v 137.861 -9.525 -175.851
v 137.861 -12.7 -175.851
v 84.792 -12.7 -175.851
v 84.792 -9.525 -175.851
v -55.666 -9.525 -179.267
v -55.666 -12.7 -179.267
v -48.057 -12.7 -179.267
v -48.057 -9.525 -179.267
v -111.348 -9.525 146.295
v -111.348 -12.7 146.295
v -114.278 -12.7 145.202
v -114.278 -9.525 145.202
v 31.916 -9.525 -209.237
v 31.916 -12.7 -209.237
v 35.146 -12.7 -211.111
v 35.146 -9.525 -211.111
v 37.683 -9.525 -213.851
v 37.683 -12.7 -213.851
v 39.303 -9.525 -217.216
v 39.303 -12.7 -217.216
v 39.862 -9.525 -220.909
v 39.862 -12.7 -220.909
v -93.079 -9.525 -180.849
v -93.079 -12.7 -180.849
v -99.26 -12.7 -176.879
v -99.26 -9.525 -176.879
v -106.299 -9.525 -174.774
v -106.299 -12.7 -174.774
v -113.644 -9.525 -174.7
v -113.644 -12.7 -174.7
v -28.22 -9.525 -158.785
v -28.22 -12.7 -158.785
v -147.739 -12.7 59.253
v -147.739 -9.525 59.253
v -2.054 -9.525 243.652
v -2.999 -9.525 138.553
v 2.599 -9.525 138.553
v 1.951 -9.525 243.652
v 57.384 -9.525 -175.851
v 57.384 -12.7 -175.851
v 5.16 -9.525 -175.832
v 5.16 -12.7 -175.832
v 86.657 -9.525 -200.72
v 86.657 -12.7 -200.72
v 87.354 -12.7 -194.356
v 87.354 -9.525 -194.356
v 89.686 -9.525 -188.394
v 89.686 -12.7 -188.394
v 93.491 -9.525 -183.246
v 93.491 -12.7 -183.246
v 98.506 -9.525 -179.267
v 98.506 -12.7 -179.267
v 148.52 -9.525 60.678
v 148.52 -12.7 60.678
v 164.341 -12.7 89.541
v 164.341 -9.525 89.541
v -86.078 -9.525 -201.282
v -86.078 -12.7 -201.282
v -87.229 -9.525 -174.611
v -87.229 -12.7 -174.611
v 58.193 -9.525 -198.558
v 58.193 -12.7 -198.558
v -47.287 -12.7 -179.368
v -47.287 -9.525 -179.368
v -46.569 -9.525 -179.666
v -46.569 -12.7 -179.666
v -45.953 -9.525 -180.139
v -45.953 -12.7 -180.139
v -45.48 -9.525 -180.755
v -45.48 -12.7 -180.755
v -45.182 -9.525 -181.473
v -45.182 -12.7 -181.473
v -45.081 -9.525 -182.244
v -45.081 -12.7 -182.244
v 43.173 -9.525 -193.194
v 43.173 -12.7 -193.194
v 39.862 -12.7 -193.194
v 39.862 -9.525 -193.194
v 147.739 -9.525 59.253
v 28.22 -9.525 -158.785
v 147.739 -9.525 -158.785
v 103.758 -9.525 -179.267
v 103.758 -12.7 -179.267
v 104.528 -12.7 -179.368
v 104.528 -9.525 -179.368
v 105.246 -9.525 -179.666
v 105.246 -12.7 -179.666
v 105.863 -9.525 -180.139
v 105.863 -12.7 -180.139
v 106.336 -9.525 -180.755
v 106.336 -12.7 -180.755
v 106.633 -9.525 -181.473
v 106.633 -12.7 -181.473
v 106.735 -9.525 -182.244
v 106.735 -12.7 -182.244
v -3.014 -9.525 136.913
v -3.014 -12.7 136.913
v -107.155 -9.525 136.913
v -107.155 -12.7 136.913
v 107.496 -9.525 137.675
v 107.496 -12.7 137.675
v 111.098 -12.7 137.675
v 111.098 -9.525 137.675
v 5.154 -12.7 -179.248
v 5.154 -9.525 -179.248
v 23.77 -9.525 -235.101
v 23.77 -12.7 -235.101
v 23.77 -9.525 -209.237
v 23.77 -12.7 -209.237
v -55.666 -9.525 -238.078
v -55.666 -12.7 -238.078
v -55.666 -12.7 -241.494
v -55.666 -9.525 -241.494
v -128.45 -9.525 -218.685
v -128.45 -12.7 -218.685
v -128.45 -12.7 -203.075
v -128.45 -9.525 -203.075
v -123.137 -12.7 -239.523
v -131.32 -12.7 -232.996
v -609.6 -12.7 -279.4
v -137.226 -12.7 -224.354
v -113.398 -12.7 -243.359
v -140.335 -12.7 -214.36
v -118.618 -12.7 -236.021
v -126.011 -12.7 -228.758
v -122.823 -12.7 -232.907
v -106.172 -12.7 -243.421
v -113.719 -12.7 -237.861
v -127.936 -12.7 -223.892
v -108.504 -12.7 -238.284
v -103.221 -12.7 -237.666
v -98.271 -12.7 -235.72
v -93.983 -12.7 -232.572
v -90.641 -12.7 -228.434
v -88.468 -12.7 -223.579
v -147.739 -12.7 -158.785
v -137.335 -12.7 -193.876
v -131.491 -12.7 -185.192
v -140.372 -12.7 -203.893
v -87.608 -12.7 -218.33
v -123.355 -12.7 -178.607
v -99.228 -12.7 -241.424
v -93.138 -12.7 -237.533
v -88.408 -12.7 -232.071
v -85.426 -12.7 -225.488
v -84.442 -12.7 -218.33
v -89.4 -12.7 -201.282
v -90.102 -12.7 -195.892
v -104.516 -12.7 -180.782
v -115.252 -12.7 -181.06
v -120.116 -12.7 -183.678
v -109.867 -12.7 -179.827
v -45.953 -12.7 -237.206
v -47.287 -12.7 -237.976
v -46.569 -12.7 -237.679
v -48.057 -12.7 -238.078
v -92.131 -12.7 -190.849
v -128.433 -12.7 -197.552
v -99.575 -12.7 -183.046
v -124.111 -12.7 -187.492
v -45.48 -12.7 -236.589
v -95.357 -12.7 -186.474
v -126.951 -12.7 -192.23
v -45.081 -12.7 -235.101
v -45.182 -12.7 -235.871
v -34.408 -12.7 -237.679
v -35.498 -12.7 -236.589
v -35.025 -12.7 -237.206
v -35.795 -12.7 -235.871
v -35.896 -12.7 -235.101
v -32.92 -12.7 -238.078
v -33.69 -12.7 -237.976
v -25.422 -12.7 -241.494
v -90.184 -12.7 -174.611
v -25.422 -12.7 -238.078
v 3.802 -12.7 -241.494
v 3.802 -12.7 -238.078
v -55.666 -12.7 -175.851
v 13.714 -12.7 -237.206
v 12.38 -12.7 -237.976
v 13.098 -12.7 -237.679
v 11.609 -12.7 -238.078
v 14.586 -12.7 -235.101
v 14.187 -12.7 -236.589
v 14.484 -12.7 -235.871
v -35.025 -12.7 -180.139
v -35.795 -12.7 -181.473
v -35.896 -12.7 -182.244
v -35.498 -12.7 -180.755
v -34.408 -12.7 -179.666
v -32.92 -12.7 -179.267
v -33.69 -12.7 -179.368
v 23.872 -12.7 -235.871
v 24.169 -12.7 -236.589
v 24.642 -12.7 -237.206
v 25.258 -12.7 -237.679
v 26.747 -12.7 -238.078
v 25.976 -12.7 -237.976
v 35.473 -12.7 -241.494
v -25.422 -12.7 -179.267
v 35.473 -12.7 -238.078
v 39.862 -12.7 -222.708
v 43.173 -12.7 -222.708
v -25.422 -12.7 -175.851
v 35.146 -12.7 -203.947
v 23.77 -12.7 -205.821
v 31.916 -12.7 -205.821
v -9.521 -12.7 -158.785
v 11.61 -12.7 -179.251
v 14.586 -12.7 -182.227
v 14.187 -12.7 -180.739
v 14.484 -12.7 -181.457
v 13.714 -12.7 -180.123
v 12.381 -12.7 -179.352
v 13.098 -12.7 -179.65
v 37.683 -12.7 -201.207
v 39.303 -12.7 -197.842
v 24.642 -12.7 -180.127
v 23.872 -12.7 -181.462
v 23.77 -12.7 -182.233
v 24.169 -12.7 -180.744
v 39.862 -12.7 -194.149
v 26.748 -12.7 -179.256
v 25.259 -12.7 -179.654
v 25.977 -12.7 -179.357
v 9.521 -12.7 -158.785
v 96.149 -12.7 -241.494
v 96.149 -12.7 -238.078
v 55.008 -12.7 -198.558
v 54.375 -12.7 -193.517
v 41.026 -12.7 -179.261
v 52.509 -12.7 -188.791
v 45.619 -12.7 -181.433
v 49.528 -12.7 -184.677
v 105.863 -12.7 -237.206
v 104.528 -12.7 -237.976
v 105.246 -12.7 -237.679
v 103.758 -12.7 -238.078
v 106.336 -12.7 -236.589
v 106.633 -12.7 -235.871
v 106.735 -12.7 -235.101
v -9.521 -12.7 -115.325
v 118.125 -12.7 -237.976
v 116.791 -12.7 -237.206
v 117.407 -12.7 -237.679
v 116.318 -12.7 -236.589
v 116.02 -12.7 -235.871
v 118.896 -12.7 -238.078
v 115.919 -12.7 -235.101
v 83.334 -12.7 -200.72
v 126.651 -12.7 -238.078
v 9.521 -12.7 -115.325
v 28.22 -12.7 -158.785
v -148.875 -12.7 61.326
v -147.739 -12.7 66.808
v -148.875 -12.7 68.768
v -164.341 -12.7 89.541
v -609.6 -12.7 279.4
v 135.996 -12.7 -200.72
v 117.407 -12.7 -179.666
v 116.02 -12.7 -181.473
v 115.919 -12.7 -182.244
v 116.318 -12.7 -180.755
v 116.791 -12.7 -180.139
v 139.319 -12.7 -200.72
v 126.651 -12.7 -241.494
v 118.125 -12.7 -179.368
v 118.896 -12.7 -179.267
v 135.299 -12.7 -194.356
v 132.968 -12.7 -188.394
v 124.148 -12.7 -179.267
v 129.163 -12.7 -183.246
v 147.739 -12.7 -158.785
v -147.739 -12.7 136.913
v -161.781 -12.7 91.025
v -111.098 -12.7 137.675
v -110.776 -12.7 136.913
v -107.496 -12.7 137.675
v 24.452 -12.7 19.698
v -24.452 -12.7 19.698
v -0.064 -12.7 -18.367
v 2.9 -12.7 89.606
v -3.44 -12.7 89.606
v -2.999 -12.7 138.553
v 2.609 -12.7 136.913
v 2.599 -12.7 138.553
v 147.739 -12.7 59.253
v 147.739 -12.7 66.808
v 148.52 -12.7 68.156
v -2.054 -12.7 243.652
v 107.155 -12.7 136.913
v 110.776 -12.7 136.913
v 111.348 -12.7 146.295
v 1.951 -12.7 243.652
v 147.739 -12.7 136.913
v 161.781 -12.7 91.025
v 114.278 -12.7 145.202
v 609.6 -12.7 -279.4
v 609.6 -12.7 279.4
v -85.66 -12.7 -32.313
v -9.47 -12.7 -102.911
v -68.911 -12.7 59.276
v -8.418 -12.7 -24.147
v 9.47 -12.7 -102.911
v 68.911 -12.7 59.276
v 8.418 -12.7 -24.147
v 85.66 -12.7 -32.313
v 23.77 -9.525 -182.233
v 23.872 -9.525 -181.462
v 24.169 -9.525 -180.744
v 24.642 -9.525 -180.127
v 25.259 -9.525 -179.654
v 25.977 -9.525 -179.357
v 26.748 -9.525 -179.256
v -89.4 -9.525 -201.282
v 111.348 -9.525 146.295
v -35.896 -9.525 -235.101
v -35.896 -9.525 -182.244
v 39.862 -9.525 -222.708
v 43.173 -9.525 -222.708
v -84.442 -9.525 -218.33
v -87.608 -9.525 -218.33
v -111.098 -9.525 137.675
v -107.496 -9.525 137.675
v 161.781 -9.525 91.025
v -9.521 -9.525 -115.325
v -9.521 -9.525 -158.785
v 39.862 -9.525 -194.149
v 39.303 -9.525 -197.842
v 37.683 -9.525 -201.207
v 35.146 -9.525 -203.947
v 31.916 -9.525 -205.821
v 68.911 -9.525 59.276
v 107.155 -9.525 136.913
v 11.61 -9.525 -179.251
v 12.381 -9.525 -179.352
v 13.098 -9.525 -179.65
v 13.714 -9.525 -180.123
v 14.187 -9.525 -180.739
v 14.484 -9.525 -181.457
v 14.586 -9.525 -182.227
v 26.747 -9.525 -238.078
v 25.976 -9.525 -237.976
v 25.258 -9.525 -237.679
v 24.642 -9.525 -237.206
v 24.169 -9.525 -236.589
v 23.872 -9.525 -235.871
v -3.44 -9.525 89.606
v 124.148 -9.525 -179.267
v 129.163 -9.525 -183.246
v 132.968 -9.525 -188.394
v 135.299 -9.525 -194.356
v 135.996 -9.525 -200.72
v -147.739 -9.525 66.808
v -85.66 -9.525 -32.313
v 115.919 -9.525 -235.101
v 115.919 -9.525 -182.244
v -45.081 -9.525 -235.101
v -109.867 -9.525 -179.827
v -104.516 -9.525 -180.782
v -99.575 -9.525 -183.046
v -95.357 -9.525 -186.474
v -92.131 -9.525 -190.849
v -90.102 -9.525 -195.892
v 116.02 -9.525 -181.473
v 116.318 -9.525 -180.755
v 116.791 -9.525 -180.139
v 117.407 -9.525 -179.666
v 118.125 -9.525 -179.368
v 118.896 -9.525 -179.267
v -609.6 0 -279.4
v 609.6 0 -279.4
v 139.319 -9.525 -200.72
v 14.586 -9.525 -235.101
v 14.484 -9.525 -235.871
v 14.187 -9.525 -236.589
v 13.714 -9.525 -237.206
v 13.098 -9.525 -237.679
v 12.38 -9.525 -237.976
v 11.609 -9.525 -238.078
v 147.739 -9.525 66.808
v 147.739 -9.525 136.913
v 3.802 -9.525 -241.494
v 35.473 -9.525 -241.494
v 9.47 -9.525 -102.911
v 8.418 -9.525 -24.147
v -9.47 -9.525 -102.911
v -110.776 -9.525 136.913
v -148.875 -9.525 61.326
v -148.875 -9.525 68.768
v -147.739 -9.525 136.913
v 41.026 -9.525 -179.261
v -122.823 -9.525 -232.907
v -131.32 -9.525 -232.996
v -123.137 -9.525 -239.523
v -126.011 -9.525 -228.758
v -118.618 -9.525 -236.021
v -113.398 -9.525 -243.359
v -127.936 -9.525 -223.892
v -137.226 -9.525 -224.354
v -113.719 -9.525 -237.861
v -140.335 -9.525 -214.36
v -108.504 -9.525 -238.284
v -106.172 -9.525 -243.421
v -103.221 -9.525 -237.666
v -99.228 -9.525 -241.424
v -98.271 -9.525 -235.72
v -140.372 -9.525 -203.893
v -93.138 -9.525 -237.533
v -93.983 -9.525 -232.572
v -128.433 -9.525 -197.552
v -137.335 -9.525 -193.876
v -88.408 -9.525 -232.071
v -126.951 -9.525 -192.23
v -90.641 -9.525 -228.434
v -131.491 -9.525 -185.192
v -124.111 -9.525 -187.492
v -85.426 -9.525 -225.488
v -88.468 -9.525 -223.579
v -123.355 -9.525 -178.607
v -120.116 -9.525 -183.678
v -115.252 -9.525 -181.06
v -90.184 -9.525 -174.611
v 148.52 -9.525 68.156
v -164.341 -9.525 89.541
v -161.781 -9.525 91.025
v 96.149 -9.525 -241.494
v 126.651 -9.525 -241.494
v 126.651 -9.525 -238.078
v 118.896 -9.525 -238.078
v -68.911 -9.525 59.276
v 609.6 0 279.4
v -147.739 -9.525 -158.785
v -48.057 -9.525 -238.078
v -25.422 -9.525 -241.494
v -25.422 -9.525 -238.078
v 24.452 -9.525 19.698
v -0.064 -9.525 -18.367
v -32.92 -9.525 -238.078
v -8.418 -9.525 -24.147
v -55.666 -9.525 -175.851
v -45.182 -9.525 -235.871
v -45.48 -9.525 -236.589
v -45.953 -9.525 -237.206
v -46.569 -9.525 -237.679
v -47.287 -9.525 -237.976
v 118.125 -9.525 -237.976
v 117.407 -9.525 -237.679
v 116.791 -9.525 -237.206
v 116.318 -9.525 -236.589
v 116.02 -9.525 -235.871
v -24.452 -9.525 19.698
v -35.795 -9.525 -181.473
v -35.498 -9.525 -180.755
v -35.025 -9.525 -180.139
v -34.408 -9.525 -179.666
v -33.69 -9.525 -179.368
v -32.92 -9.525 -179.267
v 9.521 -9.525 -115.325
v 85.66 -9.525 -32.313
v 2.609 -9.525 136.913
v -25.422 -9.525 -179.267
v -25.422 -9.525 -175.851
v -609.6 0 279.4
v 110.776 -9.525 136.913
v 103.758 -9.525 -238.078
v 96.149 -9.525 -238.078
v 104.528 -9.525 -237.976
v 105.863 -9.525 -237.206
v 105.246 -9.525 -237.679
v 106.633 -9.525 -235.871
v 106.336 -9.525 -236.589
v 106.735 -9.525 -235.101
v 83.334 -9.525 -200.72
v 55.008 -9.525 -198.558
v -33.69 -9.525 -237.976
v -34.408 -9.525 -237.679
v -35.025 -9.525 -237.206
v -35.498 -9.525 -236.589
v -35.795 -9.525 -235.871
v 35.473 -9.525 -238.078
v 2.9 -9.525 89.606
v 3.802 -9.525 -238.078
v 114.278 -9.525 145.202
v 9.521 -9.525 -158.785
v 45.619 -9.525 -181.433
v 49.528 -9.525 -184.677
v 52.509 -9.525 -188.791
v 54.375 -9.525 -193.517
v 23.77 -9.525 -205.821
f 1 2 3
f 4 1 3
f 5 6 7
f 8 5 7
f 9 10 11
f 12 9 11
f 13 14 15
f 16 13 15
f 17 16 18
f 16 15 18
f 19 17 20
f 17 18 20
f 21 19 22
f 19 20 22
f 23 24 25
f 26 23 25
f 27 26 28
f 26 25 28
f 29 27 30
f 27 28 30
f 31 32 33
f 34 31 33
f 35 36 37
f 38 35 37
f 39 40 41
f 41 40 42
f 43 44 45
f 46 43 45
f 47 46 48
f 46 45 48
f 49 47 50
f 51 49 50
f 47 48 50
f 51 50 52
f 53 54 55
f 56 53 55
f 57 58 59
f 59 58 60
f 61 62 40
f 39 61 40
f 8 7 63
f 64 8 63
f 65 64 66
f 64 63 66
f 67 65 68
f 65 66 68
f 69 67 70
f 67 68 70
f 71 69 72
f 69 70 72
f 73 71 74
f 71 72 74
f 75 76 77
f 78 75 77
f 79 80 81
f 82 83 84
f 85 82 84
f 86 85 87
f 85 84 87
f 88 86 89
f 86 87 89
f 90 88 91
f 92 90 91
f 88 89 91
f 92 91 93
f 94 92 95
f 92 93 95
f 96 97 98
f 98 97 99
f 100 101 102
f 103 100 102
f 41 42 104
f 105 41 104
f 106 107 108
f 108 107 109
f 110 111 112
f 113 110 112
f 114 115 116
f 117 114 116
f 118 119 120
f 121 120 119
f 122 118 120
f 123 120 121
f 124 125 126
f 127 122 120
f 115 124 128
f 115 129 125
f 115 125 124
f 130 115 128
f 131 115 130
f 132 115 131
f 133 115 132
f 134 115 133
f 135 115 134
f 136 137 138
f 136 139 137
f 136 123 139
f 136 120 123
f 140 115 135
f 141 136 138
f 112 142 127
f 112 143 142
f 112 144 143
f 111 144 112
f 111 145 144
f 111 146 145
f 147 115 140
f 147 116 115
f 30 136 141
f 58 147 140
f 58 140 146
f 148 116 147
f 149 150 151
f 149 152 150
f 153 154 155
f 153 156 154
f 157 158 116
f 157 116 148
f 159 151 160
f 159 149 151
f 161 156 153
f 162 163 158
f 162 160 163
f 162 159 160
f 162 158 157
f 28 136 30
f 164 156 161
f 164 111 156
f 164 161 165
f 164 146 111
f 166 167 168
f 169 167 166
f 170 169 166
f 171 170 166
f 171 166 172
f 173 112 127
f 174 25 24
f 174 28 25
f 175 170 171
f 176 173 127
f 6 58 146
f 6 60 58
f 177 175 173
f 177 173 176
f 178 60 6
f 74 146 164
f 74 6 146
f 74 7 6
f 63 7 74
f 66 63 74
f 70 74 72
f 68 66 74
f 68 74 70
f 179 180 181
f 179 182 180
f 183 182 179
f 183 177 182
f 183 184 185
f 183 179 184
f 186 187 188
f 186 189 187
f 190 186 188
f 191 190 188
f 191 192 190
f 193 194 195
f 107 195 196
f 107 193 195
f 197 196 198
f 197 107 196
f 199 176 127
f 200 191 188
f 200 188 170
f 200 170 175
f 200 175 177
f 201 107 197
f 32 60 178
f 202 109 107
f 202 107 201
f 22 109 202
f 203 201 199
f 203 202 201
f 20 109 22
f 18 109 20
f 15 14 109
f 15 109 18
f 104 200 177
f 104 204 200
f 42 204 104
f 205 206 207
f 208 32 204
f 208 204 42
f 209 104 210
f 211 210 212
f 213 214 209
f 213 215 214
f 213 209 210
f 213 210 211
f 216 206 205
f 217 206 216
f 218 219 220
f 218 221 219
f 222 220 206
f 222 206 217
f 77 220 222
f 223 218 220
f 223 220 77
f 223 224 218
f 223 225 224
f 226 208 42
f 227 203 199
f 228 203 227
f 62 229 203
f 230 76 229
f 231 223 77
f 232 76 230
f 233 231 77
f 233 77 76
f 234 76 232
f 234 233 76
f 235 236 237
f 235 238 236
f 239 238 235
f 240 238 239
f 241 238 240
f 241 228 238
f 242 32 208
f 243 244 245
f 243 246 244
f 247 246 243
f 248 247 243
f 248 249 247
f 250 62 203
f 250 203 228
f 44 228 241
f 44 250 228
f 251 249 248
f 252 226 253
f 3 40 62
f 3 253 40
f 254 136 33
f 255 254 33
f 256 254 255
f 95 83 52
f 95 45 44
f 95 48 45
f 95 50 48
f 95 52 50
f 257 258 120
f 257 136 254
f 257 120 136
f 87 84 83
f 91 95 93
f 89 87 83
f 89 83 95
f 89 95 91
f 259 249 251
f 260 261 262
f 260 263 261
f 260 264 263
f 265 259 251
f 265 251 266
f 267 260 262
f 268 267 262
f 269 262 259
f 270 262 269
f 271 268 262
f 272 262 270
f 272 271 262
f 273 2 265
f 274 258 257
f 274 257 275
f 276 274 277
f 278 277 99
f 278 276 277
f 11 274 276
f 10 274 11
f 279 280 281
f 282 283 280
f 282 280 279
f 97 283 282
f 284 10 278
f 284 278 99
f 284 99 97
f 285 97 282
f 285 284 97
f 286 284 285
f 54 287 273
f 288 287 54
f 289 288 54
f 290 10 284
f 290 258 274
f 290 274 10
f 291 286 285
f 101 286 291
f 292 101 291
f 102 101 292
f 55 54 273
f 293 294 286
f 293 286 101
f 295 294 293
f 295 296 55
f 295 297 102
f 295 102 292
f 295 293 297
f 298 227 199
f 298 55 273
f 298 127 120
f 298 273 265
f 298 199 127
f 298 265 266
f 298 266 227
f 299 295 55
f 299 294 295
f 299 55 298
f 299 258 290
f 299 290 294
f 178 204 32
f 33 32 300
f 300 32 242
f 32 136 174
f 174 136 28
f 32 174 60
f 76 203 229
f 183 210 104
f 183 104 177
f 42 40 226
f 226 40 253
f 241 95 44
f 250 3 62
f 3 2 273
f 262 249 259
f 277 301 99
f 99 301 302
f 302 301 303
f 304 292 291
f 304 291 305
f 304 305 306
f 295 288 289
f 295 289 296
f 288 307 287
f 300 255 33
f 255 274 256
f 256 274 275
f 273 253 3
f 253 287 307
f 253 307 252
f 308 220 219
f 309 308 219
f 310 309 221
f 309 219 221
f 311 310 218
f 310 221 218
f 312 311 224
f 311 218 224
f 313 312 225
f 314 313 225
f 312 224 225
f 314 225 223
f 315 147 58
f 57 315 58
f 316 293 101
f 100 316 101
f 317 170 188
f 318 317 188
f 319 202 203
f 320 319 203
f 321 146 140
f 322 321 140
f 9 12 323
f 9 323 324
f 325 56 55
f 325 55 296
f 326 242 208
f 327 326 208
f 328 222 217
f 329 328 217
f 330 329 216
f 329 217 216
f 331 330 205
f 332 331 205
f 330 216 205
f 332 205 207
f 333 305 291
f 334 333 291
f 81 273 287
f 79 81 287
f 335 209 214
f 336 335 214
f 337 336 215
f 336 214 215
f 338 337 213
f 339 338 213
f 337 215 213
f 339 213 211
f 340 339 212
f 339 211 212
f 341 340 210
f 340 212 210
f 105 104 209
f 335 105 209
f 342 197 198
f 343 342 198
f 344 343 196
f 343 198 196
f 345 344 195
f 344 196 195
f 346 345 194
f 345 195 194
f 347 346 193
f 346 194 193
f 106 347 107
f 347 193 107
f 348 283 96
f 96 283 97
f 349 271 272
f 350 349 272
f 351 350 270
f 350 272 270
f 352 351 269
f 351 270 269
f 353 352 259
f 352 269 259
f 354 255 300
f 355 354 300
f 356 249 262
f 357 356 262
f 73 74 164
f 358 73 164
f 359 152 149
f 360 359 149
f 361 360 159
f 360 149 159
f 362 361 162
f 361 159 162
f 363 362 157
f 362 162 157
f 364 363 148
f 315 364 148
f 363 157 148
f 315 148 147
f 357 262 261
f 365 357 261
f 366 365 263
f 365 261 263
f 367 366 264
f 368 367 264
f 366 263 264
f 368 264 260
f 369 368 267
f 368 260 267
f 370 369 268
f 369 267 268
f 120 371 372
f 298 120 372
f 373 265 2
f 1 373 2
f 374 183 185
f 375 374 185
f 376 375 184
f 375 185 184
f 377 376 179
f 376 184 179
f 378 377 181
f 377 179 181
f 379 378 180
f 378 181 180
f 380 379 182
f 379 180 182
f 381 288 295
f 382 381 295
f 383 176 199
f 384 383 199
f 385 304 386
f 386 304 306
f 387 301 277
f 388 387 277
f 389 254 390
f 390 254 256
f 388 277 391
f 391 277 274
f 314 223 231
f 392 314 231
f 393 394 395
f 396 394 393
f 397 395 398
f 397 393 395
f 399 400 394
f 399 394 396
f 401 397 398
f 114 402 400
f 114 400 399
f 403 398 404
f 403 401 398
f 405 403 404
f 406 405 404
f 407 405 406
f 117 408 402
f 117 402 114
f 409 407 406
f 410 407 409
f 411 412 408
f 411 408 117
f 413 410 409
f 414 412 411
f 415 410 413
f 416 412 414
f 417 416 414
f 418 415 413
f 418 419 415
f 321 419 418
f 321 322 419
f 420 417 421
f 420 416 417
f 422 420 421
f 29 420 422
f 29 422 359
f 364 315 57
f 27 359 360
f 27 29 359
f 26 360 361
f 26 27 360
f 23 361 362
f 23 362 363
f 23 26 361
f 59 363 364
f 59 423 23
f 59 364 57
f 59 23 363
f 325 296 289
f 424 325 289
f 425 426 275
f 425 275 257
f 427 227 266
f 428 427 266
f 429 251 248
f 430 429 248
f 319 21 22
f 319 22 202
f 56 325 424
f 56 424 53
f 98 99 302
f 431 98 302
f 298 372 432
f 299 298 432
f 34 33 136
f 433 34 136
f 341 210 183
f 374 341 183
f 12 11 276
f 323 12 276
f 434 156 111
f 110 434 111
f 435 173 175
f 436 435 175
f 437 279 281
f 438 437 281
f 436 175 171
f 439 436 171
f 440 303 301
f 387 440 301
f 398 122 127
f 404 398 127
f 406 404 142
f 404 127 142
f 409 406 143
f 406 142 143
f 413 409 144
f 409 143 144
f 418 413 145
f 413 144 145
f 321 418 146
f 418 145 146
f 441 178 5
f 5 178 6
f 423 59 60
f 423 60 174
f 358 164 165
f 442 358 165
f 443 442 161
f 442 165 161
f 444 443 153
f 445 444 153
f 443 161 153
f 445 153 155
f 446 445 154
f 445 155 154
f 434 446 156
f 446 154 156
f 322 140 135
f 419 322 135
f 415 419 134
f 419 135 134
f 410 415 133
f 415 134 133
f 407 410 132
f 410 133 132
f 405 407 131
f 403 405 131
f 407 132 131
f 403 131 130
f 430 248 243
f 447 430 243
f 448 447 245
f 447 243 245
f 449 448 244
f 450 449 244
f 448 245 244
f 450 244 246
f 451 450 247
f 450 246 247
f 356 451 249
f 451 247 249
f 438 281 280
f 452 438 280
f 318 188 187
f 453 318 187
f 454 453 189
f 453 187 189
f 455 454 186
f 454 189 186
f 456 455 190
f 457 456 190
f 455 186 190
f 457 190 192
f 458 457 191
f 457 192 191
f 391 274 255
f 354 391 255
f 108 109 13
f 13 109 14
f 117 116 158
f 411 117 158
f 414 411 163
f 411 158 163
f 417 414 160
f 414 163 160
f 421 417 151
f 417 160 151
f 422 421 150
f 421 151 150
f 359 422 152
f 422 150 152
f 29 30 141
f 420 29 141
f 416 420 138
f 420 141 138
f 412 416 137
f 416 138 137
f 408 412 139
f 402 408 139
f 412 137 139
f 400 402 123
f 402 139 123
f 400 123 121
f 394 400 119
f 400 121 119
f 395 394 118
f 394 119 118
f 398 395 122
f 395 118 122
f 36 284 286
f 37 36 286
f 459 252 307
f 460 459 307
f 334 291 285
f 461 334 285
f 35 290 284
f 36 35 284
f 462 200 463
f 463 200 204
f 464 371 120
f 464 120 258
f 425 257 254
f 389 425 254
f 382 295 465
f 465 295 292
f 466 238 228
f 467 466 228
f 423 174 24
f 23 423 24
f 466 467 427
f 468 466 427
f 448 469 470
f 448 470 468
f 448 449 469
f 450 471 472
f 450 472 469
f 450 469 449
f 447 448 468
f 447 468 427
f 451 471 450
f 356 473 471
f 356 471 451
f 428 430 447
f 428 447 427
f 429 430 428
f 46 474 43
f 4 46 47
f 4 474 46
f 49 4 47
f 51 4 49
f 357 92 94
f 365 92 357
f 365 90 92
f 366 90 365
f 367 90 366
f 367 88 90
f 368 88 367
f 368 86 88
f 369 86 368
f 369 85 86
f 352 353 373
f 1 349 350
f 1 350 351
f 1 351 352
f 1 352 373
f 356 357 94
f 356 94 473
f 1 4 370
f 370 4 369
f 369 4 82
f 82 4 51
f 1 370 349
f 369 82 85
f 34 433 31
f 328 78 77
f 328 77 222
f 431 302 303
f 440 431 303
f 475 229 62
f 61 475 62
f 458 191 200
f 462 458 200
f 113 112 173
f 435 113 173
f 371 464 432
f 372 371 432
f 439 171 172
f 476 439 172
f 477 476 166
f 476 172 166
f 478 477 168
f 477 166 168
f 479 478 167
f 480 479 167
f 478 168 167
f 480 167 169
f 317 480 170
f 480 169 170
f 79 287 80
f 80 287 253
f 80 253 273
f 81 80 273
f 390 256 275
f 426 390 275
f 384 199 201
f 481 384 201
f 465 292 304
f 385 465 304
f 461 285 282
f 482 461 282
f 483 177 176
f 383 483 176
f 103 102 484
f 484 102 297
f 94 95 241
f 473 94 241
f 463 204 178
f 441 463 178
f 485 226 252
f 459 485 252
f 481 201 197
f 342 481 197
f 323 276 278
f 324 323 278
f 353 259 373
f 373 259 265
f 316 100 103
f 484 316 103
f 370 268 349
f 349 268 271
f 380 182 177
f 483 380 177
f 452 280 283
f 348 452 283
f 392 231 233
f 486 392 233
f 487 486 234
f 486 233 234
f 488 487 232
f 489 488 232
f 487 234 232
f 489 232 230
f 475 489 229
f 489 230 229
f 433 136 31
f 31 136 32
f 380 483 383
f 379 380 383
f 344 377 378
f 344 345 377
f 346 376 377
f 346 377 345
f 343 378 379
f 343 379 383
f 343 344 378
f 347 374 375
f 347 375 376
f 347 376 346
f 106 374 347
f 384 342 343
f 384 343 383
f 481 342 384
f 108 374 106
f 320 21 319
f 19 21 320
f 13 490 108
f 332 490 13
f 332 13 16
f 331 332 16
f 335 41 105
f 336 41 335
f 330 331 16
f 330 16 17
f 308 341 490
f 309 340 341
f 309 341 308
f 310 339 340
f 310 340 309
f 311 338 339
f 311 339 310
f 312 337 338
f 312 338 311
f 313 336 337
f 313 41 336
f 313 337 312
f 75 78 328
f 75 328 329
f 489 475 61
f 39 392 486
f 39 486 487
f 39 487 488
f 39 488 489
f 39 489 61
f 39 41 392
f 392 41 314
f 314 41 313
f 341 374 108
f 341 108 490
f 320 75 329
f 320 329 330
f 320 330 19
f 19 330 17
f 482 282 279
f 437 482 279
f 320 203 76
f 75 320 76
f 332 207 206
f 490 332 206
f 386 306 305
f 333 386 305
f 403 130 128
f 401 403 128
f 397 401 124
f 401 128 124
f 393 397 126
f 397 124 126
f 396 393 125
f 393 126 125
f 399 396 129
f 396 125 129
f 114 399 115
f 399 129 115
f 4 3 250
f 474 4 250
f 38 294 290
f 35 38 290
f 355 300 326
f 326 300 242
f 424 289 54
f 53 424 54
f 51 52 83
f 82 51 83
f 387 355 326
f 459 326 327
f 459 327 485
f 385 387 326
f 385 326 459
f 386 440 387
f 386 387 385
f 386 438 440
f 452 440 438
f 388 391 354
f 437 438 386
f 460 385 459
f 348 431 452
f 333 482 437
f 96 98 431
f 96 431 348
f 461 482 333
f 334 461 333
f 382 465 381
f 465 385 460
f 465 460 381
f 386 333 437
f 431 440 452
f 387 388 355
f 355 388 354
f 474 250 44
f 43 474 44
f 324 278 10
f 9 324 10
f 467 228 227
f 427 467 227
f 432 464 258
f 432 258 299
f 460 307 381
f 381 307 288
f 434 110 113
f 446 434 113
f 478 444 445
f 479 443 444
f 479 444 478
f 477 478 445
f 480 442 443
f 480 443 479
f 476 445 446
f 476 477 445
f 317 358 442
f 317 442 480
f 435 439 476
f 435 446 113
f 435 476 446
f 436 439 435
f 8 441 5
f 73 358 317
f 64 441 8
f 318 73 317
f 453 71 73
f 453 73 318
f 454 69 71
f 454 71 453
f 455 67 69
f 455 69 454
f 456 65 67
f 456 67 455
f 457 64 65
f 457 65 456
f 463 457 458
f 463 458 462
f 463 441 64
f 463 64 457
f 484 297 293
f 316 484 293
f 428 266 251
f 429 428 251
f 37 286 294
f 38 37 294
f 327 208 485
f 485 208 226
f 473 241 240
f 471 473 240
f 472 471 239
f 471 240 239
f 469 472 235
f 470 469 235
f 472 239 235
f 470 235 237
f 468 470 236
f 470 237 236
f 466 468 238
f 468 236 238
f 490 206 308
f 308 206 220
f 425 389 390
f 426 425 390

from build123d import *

# Parameters (mm, degrees)
F0_W     = 1219.2
F0_H     = 558.8
F1_DEPTH = 12.7
F3_DEPTH = 3.175


# Not quite as in the source:
# - ends of sketch curves that miss each other by under 0.0002 mm in the source are joined


with BuildPart() as f1:
    # F0 (on Front) → F1 (new body)
    with BuildSketch(Plane.XZ):
        Rectangle(F0_W, F0_H)
    extrude(amount=F1_DEPTH)

    # F2 (on face) → F3 (cut)
    with BuildSketch(Plane.XZ.offset(12.7)):
        Polygon((-110.776385, 136.9130104), (-147.738846, 136.9130104), (-147.738846, 66.8081214), (-85.6601792, -32.312991), (-9.521317, -115.3251186), (-9.521317, -158.7848488), (9.521317, -158.7848488), (9.521317, -115.3251186), (85.6601538, -32.312991), (147.738846, 66.8081214), (147.738846, 136.9130104), (110.7763596, 136.9130104), (9.470136, -102.9111988), (8.4179664, -24.1473228), (68.9105556, 59.2761832), (107.1551832, 136.9130104), (2.6089356, 136.9130104), (2.900426, 89.6063994), (24.4521482, 19.6980556), (-0.0642366, -18.3666638), (-24.4521482, 19.6980556), (-3.439668, 89.6063994), (-3.0142434, 136.9130104), (-107.1551832, 136.9130104), (-68.9105556, 59.2761832), (-8.4179918, -24.1473228), (-9.470136, -102.9111988), align=None)
        Polygon((-28.2203906, -158.7848488), (-147.738846, 59.252739), (-147.738846, -158.7848488), align=None)
        Polygon((147.738846, -158.7848488), (147.738846, 59.252739), (28.2203652, -158.7848488), align=None)
        with BuildLine():
            ThreePointArc((-109.8671422064, -179.8267368126), (-95.356903919, -186.4744799885), (-89.4000786424, -201.2817666107))
            Line((-89.4000786424, -201.2817666107), (-86.0775266, -201.2817666))
            Line((-86.0775266, -201.2817666), (-87.228807, -174.6107506))
            Line((-87.228807, -174.6107506), (-90.1839446, -174.6107506))
            Line((-90.1839446, -174.6107506), (-93.0793668, -180.8493462))
            ThreePointArc((-93.0793668, -180.8493462), (-102.7053794925, -175.5791240788), (-113.6444505241, -174.7004700875))
            ThreePointArc((-113.6444505241, -174.7004700875), (-140.7442467729, -209.1274434593), (-113.39827807, -243.3592184707))
            ThreePointArc((-113.39827807, -243.3592184707), (-93.1382802166, -237.533313942), (-84.4416180716, -218.3297640292))
            Line((-84.4416180716, -218.3297640292), (-87.6078766, -218.329764))
            ThreePointArc((-87.6078766, -218.329764), (-93.9825550775, -232.5723606205), (-108.5038975848, -238.2836063253))
            ThreePointArc((-108.5038975848, -238.2836063253), (-122.8229554836, -232.9071157052), (-128.4500788749, -218.68467849))
            Line((-128.4500788749, -218.68467849), (-128.450086, -203.0753622))
            ThreePointArc((-128.450086, -203.0753622), (-124.1111022303, -187.4924501184), (-109.8671422064, -179.8267368126))
        make_face()
        with BuildLine():
            Line((-55.665624, -238.077629), (-55.665624, -241.4936496))
            Line((-55.665624, -241.4936496), (-25.422352, -241.4936496))
            Line((-25.422352, -241.4936496), (-25.422352, -238.077629))
            Line((-25.422352, -238.077629), (-32.919924, -238.077629))
            ThreePointArc((-32.919924, -238.077629), (-35.0246805086, -237.2058103086), (-35.8964992, -235.1010538))
            Line((-35.8964992, -235.1010538), (-35.8964738, -182.243603))
            ThreePointArc((-35.8964738, -182.243603), (-35.0246805086, -180.1388464914), (-32.919924, -179.2670278))
            Line((-32.919924, -179.2670278), (-25.422352, -179.2670532))
            Line((-25.422352, -179.2670532), (-25.422352, -175.8510072))
            Line((-25.422352, -175.8510072), (-55.665624, -175.8510072))
            Line((-55.665624, -175.8510072), (-55.665624, -179.2670532))
            Line((-55.665624, -179.2670532), (-48.0573588, -179.2670532))
            ThreePointArc((-48.0573588, -179.2670532), (-45.9526022914, -180.1388464914), (-45.0807836, -182.243603))
            Line((-45.0807836, -182.243603), (-45.080809, -235.1010538))
            ThreePointArc((-45.080809, -235.1010538), (-45.9526022914, -237.2058103086), (-48.0573588, -238.077629))
            Line((-48.0573588, -238.077629), (-55.665624, -238.077629))
        make_face()
        with BuildLine():
            Line((31.9159128, -205.8210006), (23.7701836, -205.8210006))
            Line((23.7701836, -205.8210006), (23.7701836, -182.2325286))
            ThreePointArc((23.7701836, -182.2325286), (24.6423974564, -180.1274129149), (26.7478255999, -179.2559789912))
            Line((26.7478255999, -179.2559789912), (41.0262324, -179.2611096))
            ThreePointArc((41.0262324, -179.2611096), (51.1481998687, -186.6406443843), (55.0079383919, -198.557616598))
            Line((55.0079383919, -198.557616598), (58.1934574, -198.5576166))
            Line((58.1934574, -198.5576166), (57.3842134, -175.8510072))
            Line((57.3842134, -175.8510072), (5.1603656, -175.8321858))
            Line((5.1603656, -175.8321858), (5.153533, -179.2482064))
            Line((5.153533, -179.2482064), (11.6103908, -179.2505178))
            ThreePointArc((11.6103908, -179.2505178), (13.7144412242, -180.1227226778), (14.5858738, -182.227093))
            Line((14.5858738, -182.227093), (14.5858738, -235.1010538))
            ThreePointArc((14.5858738, -235.1010538), (13.7140551086, -237.2058103086), (11.6092986, -238.077629))
            Line((11.6092986, -238.077629), (3.801745, -238.077629))
            Line((3.801745, -238.077629), (3.801745, -241.4936496))
            Line((3.801745, -241.4936496), (35.4731574, -241.4936496))
            Line((35.4731574, -241.4936496), (35.4731574, -238.077629))
            Line((35.4731574, -238.077629), (26.7467588, -238.077629))
            ThreePointArc((26.7467588, -238.077629), (24.6420022914, -237.2058103086), (23.7701836, -235.1010538))
            Line((23.7701836, -235.1010538), (23.7701836, -209.2370212))
            Line((23.7701836, -209.2370212), (31.9159128, -209.2370212))
            ThreePointArc((31.9159128, -209.2370212), (37.6830347812, -213.8514597759), (39.8617861947, -220.9087784101))
            Line((39.8617861947, -220.9087784101), (39.8617948, -222.7084954))
            Line((39.8617948, -222.7084954), (43.1732436, -222.7084954))
            Line((43.1732436, -222.7084954), (43.1732436, -193.1940002))
            Line((43.1732436, -193.1940002), (39.8617948, -193.1940002))
            Line((39.8617948, -193.1940002), (39.8617948, -194.1492434))
            ThreePointArc((39.8617948, -194.1492434), (37.6830347812, -201.2065620241), (31.9159128, -205.8210006))
        make_face()
        with BuildLine():
            Line((106.7346608, -182.243603), (106.7346608, -235.1010538))
            ThreePointArc((106.7346608, -235.1010538), (105.8628421086, -237.2058103086), (103.7580856, -238.077629))
            Line((103.7580856, -238.077629), (96.1487536, -238.077629))
            Line((96.1487536, -238.077629), (96.1487536, -241.4936496))
            Line((96.1487536, -241.4936496), (126.6514358, -241.4936496))
            Line((126.6514358, -241.4936496), (126.6514358, -238.077629))
            Line((126.6514358, -238.077629), (118.8955458, -238.077629))
            ThreePointArc((118.8955458, -238.077629), (116.7907892914, -237.2058103086), (115.9189706, -235.1010538))
            Line((115.9189706, -235.1010538), (115.9189706, -182.243603))
            ThreePointArc((115.9189706, -182.243603), (116.7907892914, -180.1388464914), (118.8955458, -179.2670278))
            Line((118.8955458, -179.2670278), (124.14758, -179.2670532))
            ThreePointArc((124.14758, -179.2670532), (132.9675370035, -188.3940946035), (135.9963466509, -200.7197153285))
            Line((135.9963466509, -200.7197153285), (139.3194572, -200.7197154))
            Line((139.3194572, -200.7197154), (137.8614718, -175.8510072))
            Line((137.8614718, -175.8510072), (84.7921596, -175.8510072))
            Line((84.7921596, -175.8510072), (83.3341742, -200.7197154))
            Line((83.3341742, -200.7197154), (86.6572816, -200.7197154))
            ThreePointArc((86.6572816, -200.7197154), (89.6860943965, -188.3940946035), (98.5060445889, -179.2670418075))
            Line((98.5060445889, -179.2670418075), (103.7580856, -179.2670532))
            ThreePointArc((103.7580856, -179.2670532), (105.8628421086, -180.1388464914), (106.7346608, -182.243603))
        make_face()
        Polygon((-2.0544028, 243.6519638), (-2.9994959967, 138.552993536), (2.5988306881, 138.552993536), (1.9512534, 243.6519638), align=None)
        Polygon((-164.3414798, 89.5408928), (-148.8750427961, 61.3255006909), (-148.8750427961, 68.7675664065), (-161.7813884, 91.0253958), align=None)
        Polygon((-111.3482406, 146.2952116), (-114.2778258, 145.2020718), (-111.0982667862, 137.6750104), (-107.4957333194, 137.6750104), align=None)
        Polygon((111.0982437212, 137.6750104), (114.2778258, 145.2020718), (111.3482406, 146.2952116), (107.4957333194, 137.6750104), align=None)
        Polygon((164.3414798, 89.5408928), (161.7813884, 91.0253958), (148.5202014446, 68.1556195002), (148.5202014446, 60.6781642768), align=None)
    extrude(amount=-F3_DEPTH, mode=Mode.SUBTRACT)


solid = f1.part
